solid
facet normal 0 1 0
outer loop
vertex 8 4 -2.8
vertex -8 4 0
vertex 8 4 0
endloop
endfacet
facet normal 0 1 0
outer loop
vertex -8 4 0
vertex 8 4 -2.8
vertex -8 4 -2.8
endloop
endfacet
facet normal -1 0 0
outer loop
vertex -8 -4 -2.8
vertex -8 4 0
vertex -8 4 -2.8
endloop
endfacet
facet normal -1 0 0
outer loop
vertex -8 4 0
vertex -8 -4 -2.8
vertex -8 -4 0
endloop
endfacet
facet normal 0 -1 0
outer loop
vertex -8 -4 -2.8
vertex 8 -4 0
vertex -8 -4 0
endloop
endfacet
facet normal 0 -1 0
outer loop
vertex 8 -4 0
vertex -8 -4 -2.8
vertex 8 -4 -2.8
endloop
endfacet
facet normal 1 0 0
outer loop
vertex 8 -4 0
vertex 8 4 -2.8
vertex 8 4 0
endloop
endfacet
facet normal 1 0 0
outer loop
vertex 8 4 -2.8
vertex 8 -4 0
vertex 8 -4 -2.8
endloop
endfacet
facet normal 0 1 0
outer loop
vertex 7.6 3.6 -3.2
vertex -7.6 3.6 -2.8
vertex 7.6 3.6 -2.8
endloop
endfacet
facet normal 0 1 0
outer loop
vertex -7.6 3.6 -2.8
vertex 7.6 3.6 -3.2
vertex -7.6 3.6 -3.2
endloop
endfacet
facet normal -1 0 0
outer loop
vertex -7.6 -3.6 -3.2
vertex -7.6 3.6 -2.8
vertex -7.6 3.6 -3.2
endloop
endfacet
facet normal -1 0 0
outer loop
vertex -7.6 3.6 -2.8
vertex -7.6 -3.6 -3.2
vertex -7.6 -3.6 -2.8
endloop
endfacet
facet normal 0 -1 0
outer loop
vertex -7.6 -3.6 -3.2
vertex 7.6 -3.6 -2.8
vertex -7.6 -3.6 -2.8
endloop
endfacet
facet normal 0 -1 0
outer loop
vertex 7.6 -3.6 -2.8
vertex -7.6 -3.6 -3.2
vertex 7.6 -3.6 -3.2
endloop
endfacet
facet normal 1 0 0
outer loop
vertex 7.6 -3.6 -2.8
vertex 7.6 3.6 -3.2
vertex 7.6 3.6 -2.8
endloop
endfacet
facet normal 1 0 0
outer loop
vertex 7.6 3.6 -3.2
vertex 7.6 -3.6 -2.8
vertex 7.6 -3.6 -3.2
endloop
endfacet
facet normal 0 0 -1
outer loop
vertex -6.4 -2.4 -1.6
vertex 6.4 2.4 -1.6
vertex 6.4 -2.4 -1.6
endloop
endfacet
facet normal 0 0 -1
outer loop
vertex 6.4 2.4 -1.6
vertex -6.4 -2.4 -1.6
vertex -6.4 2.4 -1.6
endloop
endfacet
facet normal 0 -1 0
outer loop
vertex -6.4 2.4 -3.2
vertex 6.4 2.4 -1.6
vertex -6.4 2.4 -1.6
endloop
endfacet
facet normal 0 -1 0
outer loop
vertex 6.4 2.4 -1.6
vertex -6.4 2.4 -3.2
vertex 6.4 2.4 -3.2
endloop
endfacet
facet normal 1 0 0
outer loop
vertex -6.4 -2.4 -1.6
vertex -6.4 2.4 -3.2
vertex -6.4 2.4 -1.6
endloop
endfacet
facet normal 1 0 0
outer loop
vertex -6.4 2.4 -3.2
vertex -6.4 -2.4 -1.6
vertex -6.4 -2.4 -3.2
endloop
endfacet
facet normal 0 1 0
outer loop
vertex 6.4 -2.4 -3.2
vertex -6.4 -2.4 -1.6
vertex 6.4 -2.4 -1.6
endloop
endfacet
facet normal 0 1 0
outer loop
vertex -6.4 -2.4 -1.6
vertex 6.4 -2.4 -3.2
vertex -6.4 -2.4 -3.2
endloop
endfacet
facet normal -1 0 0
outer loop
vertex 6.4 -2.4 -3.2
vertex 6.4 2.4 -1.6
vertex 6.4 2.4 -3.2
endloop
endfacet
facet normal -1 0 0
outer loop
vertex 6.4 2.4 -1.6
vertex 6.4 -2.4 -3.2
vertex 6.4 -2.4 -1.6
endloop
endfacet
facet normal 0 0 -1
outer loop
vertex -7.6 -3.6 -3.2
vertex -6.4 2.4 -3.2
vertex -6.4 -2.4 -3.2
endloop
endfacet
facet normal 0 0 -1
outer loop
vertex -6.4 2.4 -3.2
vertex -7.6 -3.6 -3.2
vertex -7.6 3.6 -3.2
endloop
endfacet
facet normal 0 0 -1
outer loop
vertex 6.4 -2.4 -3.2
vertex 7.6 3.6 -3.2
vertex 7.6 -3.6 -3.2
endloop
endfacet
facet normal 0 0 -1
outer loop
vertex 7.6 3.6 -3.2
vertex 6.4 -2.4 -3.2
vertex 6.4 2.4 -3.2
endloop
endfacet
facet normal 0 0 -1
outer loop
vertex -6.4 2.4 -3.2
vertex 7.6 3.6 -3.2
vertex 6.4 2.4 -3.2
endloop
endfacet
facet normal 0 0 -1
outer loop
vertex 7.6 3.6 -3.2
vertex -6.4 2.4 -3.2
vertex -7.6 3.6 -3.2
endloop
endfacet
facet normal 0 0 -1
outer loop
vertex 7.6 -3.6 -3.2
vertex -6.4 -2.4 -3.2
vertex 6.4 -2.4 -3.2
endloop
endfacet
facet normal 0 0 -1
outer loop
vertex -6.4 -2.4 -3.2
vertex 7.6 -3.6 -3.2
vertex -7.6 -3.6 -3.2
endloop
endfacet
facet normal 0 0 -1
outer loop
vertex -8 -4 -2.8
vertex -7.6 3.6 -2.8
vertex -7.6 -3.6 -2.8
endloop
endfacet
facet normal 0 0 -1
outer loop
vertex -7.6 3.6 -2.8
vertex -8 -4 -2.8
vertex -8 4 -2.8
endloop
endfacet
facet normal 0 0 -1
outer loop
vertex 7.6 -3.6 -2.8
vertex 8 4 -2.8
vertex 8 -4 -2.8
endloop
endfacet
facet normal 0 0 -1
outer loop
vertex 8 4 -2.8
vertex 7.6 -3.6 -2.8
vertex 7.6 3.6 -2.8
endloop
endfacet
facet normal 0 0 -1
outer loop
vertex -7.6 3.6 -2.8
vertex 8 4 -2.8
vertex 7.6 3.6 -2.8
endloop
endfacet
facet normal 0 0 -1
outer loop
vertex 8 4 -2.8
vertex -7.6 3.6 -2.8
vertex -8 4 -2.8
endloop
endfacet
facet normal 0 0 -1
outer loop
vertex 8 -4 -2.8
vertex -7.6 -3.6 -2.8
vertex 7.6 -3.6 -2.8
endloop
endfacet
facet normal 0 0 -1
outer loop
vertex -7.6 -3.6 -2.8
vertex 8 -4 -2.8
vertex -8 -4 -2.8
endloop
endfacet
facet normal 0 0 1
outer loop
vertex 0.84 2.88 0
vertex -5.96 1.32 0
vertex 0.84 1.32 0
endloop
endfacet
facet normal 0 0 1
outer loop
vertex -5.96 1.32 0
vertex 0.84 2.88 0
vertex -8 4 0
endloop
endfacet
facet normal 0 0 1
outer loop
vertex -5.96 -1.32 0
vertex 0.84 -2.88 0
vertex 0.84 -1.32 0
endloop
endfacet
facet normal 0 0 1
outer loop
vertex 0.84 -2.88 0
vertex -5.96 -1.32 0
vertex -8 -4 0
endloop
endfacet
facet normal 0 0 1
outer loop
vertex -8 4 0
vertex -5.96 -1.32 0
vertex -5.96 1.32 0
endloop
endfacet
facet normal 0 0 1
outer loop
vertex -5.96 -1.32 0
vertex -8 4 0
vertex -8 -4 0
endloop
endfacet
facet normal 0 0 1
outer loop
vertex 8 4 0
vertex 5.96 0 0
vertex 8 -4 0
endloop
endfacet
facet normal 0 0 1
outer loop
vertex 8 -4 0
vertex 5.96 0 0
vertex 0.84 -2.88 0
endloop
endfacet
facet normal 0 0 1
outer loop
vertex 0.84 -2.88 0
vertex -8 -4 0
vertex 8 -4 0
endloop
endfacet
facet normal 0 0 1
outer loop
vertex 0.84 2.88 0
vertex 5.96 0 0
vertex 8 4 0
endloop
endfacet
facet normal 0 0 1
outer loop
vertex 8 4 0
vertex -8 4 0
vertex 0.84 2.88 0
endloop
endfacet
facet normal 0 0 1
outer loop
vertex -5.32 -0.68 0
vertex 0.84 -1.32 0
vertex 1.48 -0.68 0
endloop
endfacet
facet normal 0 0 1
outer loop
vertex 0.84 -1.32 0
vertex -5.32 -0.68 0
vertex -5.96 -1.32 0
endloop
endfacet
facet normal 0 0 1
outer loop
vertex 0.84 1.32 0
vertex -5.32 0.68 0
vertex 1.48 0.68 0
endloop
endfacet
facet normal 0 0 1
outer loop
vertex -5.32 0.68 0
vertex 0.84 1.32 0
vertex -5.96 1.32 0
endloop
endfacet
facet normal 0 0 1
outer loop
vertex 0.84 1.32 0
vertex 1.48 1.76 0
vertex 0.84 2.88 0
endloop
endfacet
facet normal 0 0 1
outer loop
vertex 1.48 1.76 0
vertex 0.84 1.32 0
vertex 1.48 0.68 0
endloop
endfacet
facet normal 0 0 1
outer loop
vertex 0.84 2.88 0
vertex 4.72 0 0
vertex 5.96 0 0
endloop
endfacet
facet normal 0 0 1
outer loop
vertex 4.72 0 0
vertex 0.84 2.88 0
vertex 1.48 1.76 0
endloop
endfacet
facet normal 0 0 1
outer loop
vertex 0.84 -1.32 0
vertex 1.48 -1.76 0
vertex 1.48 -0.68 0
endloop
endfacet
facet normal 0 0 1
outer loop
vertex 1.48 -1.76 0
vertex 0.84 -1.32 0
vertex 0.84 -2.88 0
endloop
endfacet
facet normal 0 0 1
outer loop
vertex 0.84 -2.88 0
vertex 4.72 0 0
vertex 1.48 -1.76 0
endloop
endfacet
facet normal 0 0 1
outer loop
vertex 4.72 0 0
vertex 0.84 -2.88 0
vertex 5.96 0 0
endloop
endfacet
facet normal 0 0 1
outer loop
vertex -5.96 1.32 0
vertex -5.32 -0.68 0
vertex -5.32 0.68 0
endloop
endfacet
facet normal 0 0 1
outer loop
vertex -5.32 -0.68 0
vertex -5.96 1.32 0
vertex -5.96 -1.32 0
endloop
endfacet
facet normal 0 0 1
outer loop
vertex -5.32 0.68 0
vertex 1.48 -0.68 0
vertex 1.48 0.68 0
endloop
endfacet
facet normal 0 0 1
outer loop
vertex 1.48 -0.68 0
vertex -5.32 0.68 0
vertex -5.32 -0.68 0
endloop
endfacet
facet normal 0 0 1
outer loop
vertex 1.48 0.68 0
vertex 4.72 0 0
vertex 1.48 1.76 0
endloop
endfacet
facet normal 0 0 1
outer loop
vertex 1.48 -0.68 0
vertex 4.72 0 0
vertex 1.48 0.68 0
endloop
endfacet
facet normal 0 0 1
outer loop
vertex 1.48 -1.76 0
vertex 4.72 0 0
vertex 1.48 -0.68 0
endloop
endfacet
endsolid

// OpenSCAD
// file: ../p/4-4edge.scad
use <../lib.scad>
$fa=1; $fs=0.2;
function ldraw_lib__4_4edge(realsolid=false) = [
// 0 Circle 1.0
// 0 Name: 4-4edge.dat
// 0 Author: James Jessiman
// 0 !LDRAW_ORG Primitive UPDATE 2017-01
// 0 !LICENSE Licensed under CC BY 2.0 and CC BY 4.0 : see CAreadme.txt
// 
// 0 BFC CERTIFY CCW
  [0,"BFC","CERTIFY"],
  [0,"BFC","CCW"],
// 
// 0 !HISTORY 1998-12-15 [PTadmin] Official Update 1998-10
// 0 !HISTORY 2005-12-28 [PTadmin] Official Update 2005-01
// 0 !HISTORY 2007-06-24 [PTadmin] Header formatted for Contributor Agreement
// 0 !HISTORY 2008-07-01 [PTadmin] Official Update 2008-01
// 0 !HISTORY 2017-01-15 [Steffen] BFCed
// 0 !HISTORY 2017-12-30 [PTadmin] Official Update 2017-01
// 
// 
// 2 24 1 0 0 0.9239 0 0.3827
  [2,24,1,0,0,0.9239,0,0.3827],
// 2 24 0.9239 0 0.3827 0.7071 0 0.7071
  [2,24,0.9239,0,0.3827,0.7071,0,0.7071],
// 2 24 0.7071 0 0.7071 0.3827 0 0.9239
  [2,24,0.7071,0,0.7071,0.3827,0,0.9239],
// 2 24 0.3827 0 0.9239 0 0 1
  [2,24,0.3827,0,0.9239,0,0,1],
// 2 24 0 0 1 -0.3827 0 0.9239
  [2,24,0,0,1,-0.3827,0,0.9239],
// 2 24 -0.3827 0 0.9239 -0.7071 0 0.7071
  [2,24,-0.3827,0,0.9239,-0.7071,0,0.7071],
// 2 24 -0.7071 0 0.7071 -0.9239 0 0.3827
  [2,24,-0.7071,0,0.7071,-0.9239,0,0.3827],
// 2 24 -0.9239 0 0.3827 -1 0 -0
  [2,24,-0.9239,0,0.3827,-1,0,-0],
// 2 24 -1 0 -0 -0.9239 0 -0.3827
  [2,24,-1,0,-0,-0.9239,0,-0.3827],
// 2 24 -0.9239 0 -0.3827 -0.7071 0 -0.7071
  [2,24,-0.9239,0,-0.3827,-0.7071,0,-0.7071],
// 2 24 -0.7071 0 -0.7071 -0.3827 0 -0.9239
  [2,24,-0.7071,0,-0.7071,-0.3827,0,-0.9239],
// 2 24 -0.3827 0 -0.9239 0 0 -1
  [2,24,-0.3827,0,-0.9239,0,0,-1],
// 2 24 0 0 -1 0.3827 0 -0.9239
  [2,24,0,0,-1,0.3827,0,-0.9239],
// 2 24 0.3827 0 -0.9239 0.7071 0 -0.7071
  [2,24,0.3827,0,-0.9239,0.7071,0,-0.7071],
// 2 24 0.7071 0 -0.7071 0.9239 0 -0.3827
  [2,24,0.7071,0,-0.7071,0.9239,0,-0.3827],
// 2 24 0.9239 0 -0.3827 1 0 0
  [2,24,0.9239,0,-0.3827,1,0,0],
];
module ldraw_lib__4_4edge(step=0, col=false, unit=2/5, alt=false, line=0.2, solid=!$preview)
    makepoly(ldraw_lib__4_4edge(solid), step=step, col=col, unit=unit, alt=alt, line=line, solid=solid);
ldraw_lib__4_4edge(line=0.2);
// file: ../p/4-4disc.scad
use <../lib.scad>
$fa=1; $fs=0.2;
function ldraw_lib__4_4disc(realsolid=false) = [
// 0 Disc 1.0
// 0 Name: 4-4disc.dat
// 0 Author: James Jessiman
// 0 !LDRAW_ORG Primitive UPDATE 2002-02
// 0 !LICENSE Licensed under CC BY 2.0 and CC BY 4.0 : see CAreadme.txt
// 
// 0 BFC CERTIFY CCW
  [0,"BFC","CERTIFY"],
  [0,"BFC","CCW"],
// 
// 0 !HISTORY 1998-12-15 [PTadmin] Official Update 1998-10
// 0 !HISTORY 2002-03-23 [sbliss] Added BFC statement
// 0 !HISTORY 2002-04-25 [PTadmin] Official Update 2002-02
// 0 !HISTORY 2007-06-24 [PTadmin] Header formatted for Contributor Agreement
// 0 !HISTORY 2008-07-01 [PTadmin] Official Update 2008-01
// 
// 
// 3 16 0 0 0 1 0 0 0.9239 0 0.3827
  [3,16,0,0,0,1,0,0,0.9239,0,0.3827],
// 3 16 0 0 0 0.9239 0 0.3827 0.7071 0 0.7071
  [3,16,0,0,0,0.9239,0,0.3827,0.7071,0,0.7071],
// 3 16 0 0 0 0.7071 0 0.7071 0.3827 0 0.9239
  [3,16,0,0,0,0.7071,0,0.7071,0.3827,0,0.9239],
// 3 16 0 0 0 0.3827 0 0.9239 0 0 1
  [3,16,0,0,0,0.3827,0,0.9239,0,0,1],
// 3 16 0 0 0 0 0 1 -0.3827 0 0.9239
  [3,16,0,0,0,0,0,1,-0.3827,0,0.9239],
// 3 16 0 0 0 -0.3827 0 0.9239 -0.7071 0 0.7071
  [3,16,0,0,0,-0.3827,0,0.9239,-0.7071,0,0.7071],
// 3 16 0 0 0 -0.7071 0 0.7071 -0.9239 0 0.3827
  [3,16,0,0,0,-0.7071,0,0.7071,-0.9239,0,0.3827],
// 3 16 0 0 0 -0.9239 0 0.3827 -1 0 -0
  [3,16,0,0,0,-0.9239,0,0.3827,-1,0,-0],
// 3 16 0 0 0 -1 0 -0 -0.9239 0 -0.3827
  [3,16,0,0,0,-1,0,-0,-0.9239,0,-0.3827],
// 3 16 0 0 0 -0.9239 0 -0.3827 -0.7071 0 -0.7071
  [3,16,0,0,0,-0.9239,0,-0.3827,-0.7071,0,-0.7071],
// 3 16 0 0 0 -0.7071 0 -0.7071 -0.3827 0 -0.9239
  [3,16,0,0,0,-0.7071,0,-0.7071,-0.3827,0,-0.9239],
// 3 16 0 0 0 -0.3827 0 -0.9239 0 0 -1
  [3,16,0,0,0,-0.3827,0,-0.9239,0,0,-1],
// 3 16 0 0 0 0 0 -1 0.3827 0 -0.9239
  [3,16,0,0,0,0,0,-1,0.3827,0,-0.9239],
// 3 16 0 0 0 0.3827 0 -0.9239 0.7071 0 -0.7071
  [3,16,0,0,0,0.3827,0,-0.9239,0.7071,0,-0.7071],
// 3 16 0 0 0 0.7071 0 -0.7071 0.9239 0 -0.3827
  [3,16,0,0,0,0.7071,0,-0.7071,0.9239,0,-0.3827],
// 3 16 0 0 0 0.9239 0 -0.3827 1 0 0
  [3,16,0,0,0,0.9239,0,-0.3827,1,0,0],
// 0
];
module ldraw_lib__4_4disc(step=0, col=false, unit=2/5, alt=false, line=0.2, solid=!$preview)
    makepoly(ldraw_lib__4_4disc(solid), step=step, col=col, unit=unit, alt=alt, line=line, solid=solid);
ldraw_lib__4_4disc(line=0.2);
// file: ../p/4-4cyli.scad
use <../lib.scad>
$fa=1; $fs=0.2;
function ldraw_lib__4_4cyli(realsolid=false) = [
// 0 Cylinder 1.0
// 0 Name: 4-4cyli.dat
// 0 Author: James Jessiman
// 0 !LDRAW_ORG Primitive UPDATE 2005-01
// 0 !LICENSE Licensed under CC BY 2.0 and CC BY 4.0 : see CAreadme.txt
// 
// 0 BFC CERTIFY CCW
  [0,"BFC","CERTIFY"],
  [0,"BFC","CCW"],
// 
// 0 !HISTORY 1998-12-15 [PTadmin] Official Update 1998-10
// 0 !HISTORY 2002-03-23 [sbliss] Added BFC statement; merged headers from files in distributions LDraw 0.27 and Complete.
// 0 !HISTORY 2002-04-25 [PTadmin] Official Update 2002-02
// 0 !HISTORY 2004-12-14 [guyvivan] BFC CCW
// 0 !HISTORY 2005-12-28 [PTadmin] Official Update 2005-01
// 0 !HISTORY 2007-06-24 [PTadmin] Header formatted for Contributor Agreement
// 0 !HISTORY 2008-07-01 [PTadmin] Official Update 2008-01
// 
// 
// 4 16 1 1 0 0.9239 1 0.3827 0.9239 0 0.3827 1 0 0
  [4,16,1,1,0,0.9239,1,0.3827,0.9239,0,0.3827,1,0,0],
// 5 24 1 0 0 1 1 0 0.9239 0 0.3827 0.9239 0 -0.3827
  [5,24,1,0,0,1,1,0,0.9239,0,0.3827,0.9239,0,-0.3827],
// 4 16 0.9239 1 0.3827 0.7071 1 0.7071 0.7071 0 0.7071 0.9239 0 0.3827
  [4,16,0.9239,1,0.3827,0.7071,1,0.7071,0.7071,0,0.7071,0.9239,0,0.3827],
// 5 24 0.9239 0 0.3827 0.9239 1 0.3827 0.7071 0 0.7071 1 0 0
  [5,24,0.9239,0,0.3827,0.9239,1,0.3827,0.7071,0,0.7071,1,0,0],
// 4 16 0.7071 1 0.7071 0.3827 1 0.9239 0.3827 0 0.9239 0.7071 0 0.7071
  [4,16,0.7071,1,0.7071,0.3827,1,0.9239,0.3827,0,0.9239,0.7071,0,0.7071],
// 5 24 0.7071 0 0.7071 0.7071 1 0.7071 0.3827 0 0.9239 0.9239 0 0.3827
  [5,24,0.7071,0,0.7071,0.7071,1,0.7071,0.3827,0,0.9239,0.9239,0,0.3827],
// 4 16 0.3827 1 0.9239 0 1 1 0 0 1 0.3827 0 0.9239
  [4,16,0.3827,1,0.9239,0,1,1,0,0,1,0.3827,0,0.9239],
// 5 24 0.3827 0 0.9239 0.3827 1 0.9239 0 0 1 0.7071 0 0.7071
  [5,24,0.3827,0,0.9239,0.3827,1,0.9239,0,0,1,0.7071,0,0.7071],
// 4 16 0 1 1 -0.3827 1 0.9239 -0.3827 0 0.9239 0 0 1
  [4,16,0,1,1,-0.3827,1,0.9239,-0.3827,0,0.9239,0,0,1],
// 5 24 0 0 1 0 1 1 -0.3827 0 0.9239 0.3827 0 0.9239
  [5,24,0,0,1,0,1,1,-0.3827,0,0.9239,0.3827,0,0.9239],
// 4 16 -0.3827 1 0.9239 -0.7071 1 0.7071 -0.7071 0 0.7071 -0.3827 0 0.9239
  [4,16,-0.3827,1,0.9239,-0.7071,1,0.7071,-0.7071,0,0.7071,-0.3827,0,0.9239],
// 5 24 -0.3827 0 0.9239 -0.3827 1 0.9239 -0.7071 0 0.7071 0 0 1
  [5,24,-0.3827,0,0.9239,-0.3827,1,0.9239,-0.7071,0,0.7071,0,0,1],
// 4 16 -0.7071 1 0.7071 -0.9239 1 0.3827 -0.9239 0 0.3827 -0.7071 0 0.7071
  [4,16,-0.7071,1,0.7071,-0.9239,1,0.3827,-0.9239,0,0.3827,-0.7071,0,0.7071],
// 5 24 -0.7071 0 0.7071 -0.7071 1 0.7071 -0.9239 0 0.3827 -0.3827 0 0.9239
  [5,24,-0.7071,0,0.7071,-0.7071,1,0.7071,-0.9239,0,0.3827,-0.3827,0,0.9239],
// 4 16 -0.9239 1 0.3827 -1 1 0 -1 0 0 -0.9239 0 0.3827
  [4,16,-0.9239,1,0.3827,-1,1,0,-1,0,0,-0.9239,0,0.3827],
// 5 24 -0.9239 0 0.3827 -0.9239 1 0.3827 -1 0 0 -0.7071 0 0.7071
  [5,24,-0.9239,0,0.3827,-0.9239,1,0.3827,-1,0,0,-0.7071,0,0.7071],
// 4 16 -1 1 0 -0.9239 1 -0.3827 -0.9239 0 -0.3827 -1 0 0
  [4,16,-1,1,0,-0.9239,1,-0.3827,-0.9239,0,-0.3827,-1,0,0],
// 5 24 -1 0 0 -1 1 0 -0.9239 0 -0.3827 -0.9239 0 0.3827
  [5,24,-1,0,0,-1,1,0,-0.9239,0,-0.3827,-0.9239,0,0.3827],
// 4 16 -0.9239 1 -0.3827 -0.7071 1 -0.7071 -0.7071 0 -0.7071 -0.9239 0 -0.3827
  [4,16,-0.9239,1,-0.3827,-0.7071,1,-0.7071,-0.7071,0,-0.7071,-0.9239,0,-0.3827],
// 5 24 -0.9239 0 -0.3827 -0.9239 1 -0.3827 -0.7071 0 -0.7071 -1 0 0
  [5,24,-0.9239,0,-0.3827,-0.9239,1,-0.3827,-0.7071,0,-0.7071,-1,0,0],
// 4 16 -0.7071 1 -0.7071 -0.3827 1 -0.9239 -0.3827 0 -0.9239 -0.7071 0 -0.7071
  [4,16,-0.7071,1,-0.7071,-0.3827,1,-0.9239,-0.3827,0,-0.9239,-0.7071,0,-0.7071],
// 5 24 -0.7071 0 -0.7071 -0.7071 1 -0.7071 -0.3827 0 -0.9239 -0.9239 0 -0.3827
  [5,24,-0.7071,0,-0.7071,-0.7071,1,-0.7071,-0.3827,0,-0.9239,-0.9239,0,-0.3827],
// 4 16 -0.3827 1 -0.9239 0 1 -1 0 0 -1 -0.3827 0 -0.9239
  [4,16,-0.3827,1,-0.9239,0,1,-1,0,0,-1,-0.3827,0,-0.9239],
// 5 24 -0.3827 0 -0.9239 -0.3827 1 -0.9239 0 0 -1 -0.7071 0 -0.7071
  [5,24,-0.3827,0,-0.9239,-0.3827,1,-0.9239,0,0,-1,-0.7071,0,-0.7071],
// 4 16 0 1 -1 0.3827 1 -0.9239 0.3827 0 -0.9239 0 0 -1
  [4,16,0,1,-1,0.3827,1,-0.9239,0.3827,0,-0.9239,0,0,-1],
// 5 24 0 0 -1 0 1 -1 0.3827 0 -0.9239 -0.3827 0 -0.9239
  [5,24,0,0,-1,0,1,-1,0.3827,0,-0.9239,-0.3827,0,-0.9239],
// 4 16 0.3827 1 -0.9239 0.7071 1 -0.7071 0.7071 0 -0.7071 0.3827 0 -0.9239
  [4,16,0.3827,1,-0.9239,0.7071,1,-0.7071,0.7071,0,-0.7071,0.3827,0,-0.9239],
// 5 24 0.3827 0 -0.9239 0.3827 1 -0.9239 0.7071 0 -0.7071 0 0 -1
  [5,24,0.3827,0,-0.9239,0.3827,1,-0.9239,0.7071,0,-0.7071,0,0,-1],
// 4 16 0.7071 1 -0.7071 0.9239 1 -0.3827 0.9239 0 -0.3827 0.7071 0 -0.7071
  [4,16,0.7071,1,-0.7071,0.9239,1,-0.3827,0.9239,0,-0.3827,0.7071,0,-0.7071],
// 5 24 0.7071 0 -0.7071 0.7071 1 -0.7071 0.9239 0 -0.3827 0.3827 0 -0.9239
  [5,24,0.7071,0,-0.7071,0.7071,1,-0.7071,0.9239,0,-0.3827,0.3827,0,-0.9239],
// 4 16 0.9239 1 -0.3827 1 1 0 1 0 0 0.9239 0 -0.3827
  [4,16,0.9239,1,-0.3827,1,1,0,1,0,0,0.9239,0,-0.3827],
// 5 24 0.9239 0 -0.3827 0.9239 1 -0.3827 1 0 0 0.7071 0 -0.7071
  [5,24,0.9239,0,-0.3827,0.9239,1,-0.3827,1,0,0,0.7071,0,-0.7071],
// 0
];
module ldraw_lib__4_4cyli(step=0, col=false, unit=2/5, alt=false, line=0.2, solid=!$preview)
    makepoly(ldraw_lib__4_4cyli(solid), step=step, col=col, unit=unit, alt=alt, line=line, solid=solid);
ldraw_lib__4_4cyli(line=0.2);
// file: ../p/stud3.scad
use <../lib.scad>
use <4-4cyli.scad>
use <4-4disc.scad>
use <4-4edge.scad>
$fa=1; $fs=0.2;
function ldraw_lib__stud3(realsolid=false) = realsolid ? 
    [openscad(translate([0,0,-eps()], o=cylinder(4+eps(), r=4)),2)] : [
// 0 Stud Tube Solid
// 0 Name: stud3.dat
// 0 Author: James Jessiman
// 0 !LDRAW_ORG Primitive UPDATE 2012-01
// 0 !LICENSE Licensed under CC BY 2.0 and CC BY 4.0 : see CAreadme.txt
// 
// 0 BFC CERTIFY CCW
  [0,"BFC","CERTIFY"],
  [0,"BFC","CCW"],
// 
// 0 !HISTORY 2002-04-04 [sbliss] Modified for BFC compliance
// 0 !HISTORY 2002-04-25 [PTadmin] Official Update 2002-02
// 0 !HISTORY 2007-06-24 [PTadmin] Header formatted for Contributor Agreement
// 0 !HISTORY 2008-07-01 [PTadmin] Official Update 2008-01
// 0 !HISTORY 2012-02-16 [Philo] Changed to CCW
// 0 !HISTORY 2012-03-30 [PTadmin] Official Update 2012-01
// 
// 
// 1 16 0 -4 0 4 0 0 0 1 0 0 0 4 4-4edge.dat
  [1,16,0,-4,0,4,0,0,0,1,0,0,0,4, ldraw_lib__4_4edge(realsolid)],
// 1 16 0 0 0 4 0 0 0 1 0 0 0 4 4-4edge.dat
  [1,16,0,0,0,4,0,0,0,1,0,0,0,4, ldraw_lib__4_4edge(realsolid)],
// 1 16 0 -4 0 4 0 0 0 1 0 0 0 4 4-4disc.dat
  [1,16,0,-4,0,4,0,0,0,1,0,0,0,4, ldraw_lib__4_4disc(realsolid)],
// 1 16 0 -4 0 4 0 0 0 4 0 0 0 4 4-4cyli.dat
  [1,16,0,-4,0,4,0,0,0,4,0,0,0,4, ldraw_lib__4_4cyli(realsolid)],
];
module ldraw_lib__stud3(step=0, col=false, unit=2/5, alt=false, line=0.2, solid=!$preview)
    makepoly(ldraw_lib__stud3(solid), step=step, col=col, unit=unit, alt=alt, line=line, solid=solid);
ldraw_lib__stud3(line=0.2);
// file: ../p/stud.scad
use <../lib.scad>
use <4-4cyli.scad>
use <4-4disc.scad>
use <4-4edge.scad>
$fa=1; $fs=0.2;
function ldraw_lib__stud(realsolid=false) = realsolid ? 
    [openscad(translate([0,0,-eps()], o=cylinder(4+eps(), r=6)),2)] : [
// 0 Stud
// 0 Name: stud.dat
// 0 Author: James Jessiman
// 0 !LDRAW_ORG Primitive UPDATE 2012-01
// 0 !LICENSE Licensed under CC BY 2.0 and CC BY 4.0 : see CAreadme.txt
// 
// 0 BFC CERTIFY CCW
  [0,"BFC","CERTIFY"],
  [0,"BFC","CCW"],
// 
// 0 !HISTORY 2002-04-04 [sbliss] Modified for BFC compliance
// 0 !HISTORY 2002-04-25 [PTadmin] Official Update 2002-02
// 0 !HISTORY 2007-06-24 [PTadmin] Header formatted for Contributor Agreement
// 0 !HISTORY 2008-07-01 [PTadmin] Official Update 2008-01
// 0 !HISTORY 2012-02-16 [Philo] Changed to CCW
// 0 !HISTORY 2012-03-30 [PTadmin] Official Update 2012-01
// 
// 
// 1 16 0 0 0 6 0 0 0 1 0 0 0 6 4-4edge.dat
  [1,16,0,0,0,6,0,0,0,1,0,0,0,6, ldraw_lib__4_4edge(realsolid)],
// 1 16 0 -4 0 6 0 0 0 1 0 0 0 6 4-4edge.dat
  [1,16,0,-4,0,6,0,0,0,1,0,0,0,6, ldraw_lib__4_4edge(realsolid)],
// 1 16 0 0 0 6 0 0 0 -4 0 0 0 6 4-4cyli.dat
  [1,16,0,0,0,6,0,0,0,-4,0,0,0,6, ldraw_lib__4_4cyli(realsolid)],
// 1 16 0 -4 0 6 0 0 0 1 0 0 0 6 4-4disc.dat
  [1,16,0,-4,0,6,0,0,0,1,0,0,0,6, ldraw_lib__4_4disc(realsolid)],
];
module ldraw_lib__stud(step=0, col=false, unit=2/5, alt=false, line=0.2, solid=!$preview)
    makepoly(ldraw_lib__stud(solid), step=step, col=col, unit=unit, alt=alt, line=line, solid=solid);
ldraw_lib__stud(line=0.2);
// file: ../p/box4t.scad
use <../lib.scad>
$fa=1; $fs=0.2;
function ldraw_lib__box4t(realsolid=false) = [
// 0 Box with 4 Adjacent Faces and All Edges
// 0 Name: box4t.dat
// 0 Author: Tore Eriksson [Tore_Eriksson]
// 0 !LDRAW_ORG Primitive UPDATE 2003-02
// 0 !LICENSE Licensed under CC BY 2.0 and CC BY 4.0 : see CAreadme.txt
// 
// 0 BFC CERTIFY CCW
  [0,"BFC","CERTIFY"],
  [0,"BFC","CCW"],
// 
// 0 !HISTORY 1997-09-29 [PTadmin] Official Update 1997-15
// 0 !HISTORY 2002-08-31 [izanette] Modified with WINDZ for BFC compliance
// 0 !HISTORY 2003-08-01 [PTadmin] Official Update 2003-02
// 0 !HISTORY 2007-06-24 [PTadmin] Header formatted for Contributor Agreement
// 0 !HISTORY 2008-07-01 [PTadmin] Official Update 2008-01
// 
// 
// 2 24 1 1 1 -1 1 1
  [2,24,1,1,1,-1,1,1],
// 2 24 -1 1 1 -1 1 -1
  [2,24,-1,1,1,-1,1,-1],
// 2 24 -1 1 -1 1 1 -1
  [2,24,-1,1,-1,1,1,-1],
// 2 24 1 1 -1 1 1 1
  [2,24,1,1,-1,1,1,1],
// 2 24 1 0 1 -1 0 1
  [2,24,1,0,1,-1,0,1],
// 2 24 -1 0 1 -1 0 -1
  [2,24,-1,0,1,-1,0,-1],
// 2 24 -1 0 -1 1 0 -1
  [2,24,-1,0,-1,1,0,-1],
// 2 24 1 0 -1 1 0 1
  [2,24,1,0,-1,1,0,1],
// 2 24 1 0 1 1 1 1
  [2,24,1,0,1,1,1,1],
// 2 24 -1 0 1 -1 1 1
  [2,24,-1,0,1,-1,1,1],
// 2 24 1 0 -1 1 1 -1
  [2,24,1,0,-1,1,1,-1],
// 2 24 -1 0 -1 -1 1 -1
  [2,24,-1,0,-1,-1,1,-1],
// 4 16 1 1 1 1 1 -1 -1 1 -1 -1 1 1
  [4,16,1,1,1,1,1,-1,-1,1,-1,-1,1,1],
// 4 16 1 1 1 -1 1 1 -1 0 1 1 0 1
  [4,16,1,1,1,-1,1,1,-1,0,1,1,0,1],
// 4 16 -1 1 1 -1 1 -1 -1 0 -1 -1 0 1
  [4,16,-1,1,1,-1,1,-1,-1,0,-1,-1,0,1],
// 0 4 16 -1 1 -1 -1 0 -1 1 0 -1 1 1 -1
// 4 16 1 1 -1 1 1 1 1 0 1 1 0 -1
  [4,16,1,1,-1,1,1,1,1,0,1,1,0,-1],
// 0
];
module ldraw_lib__box4t(step=0, col=false, unit=2/5, alt=false, line=0.2, solid=!$preview)
    makepoly(ldraw_lib__box4t(solid), step=step, col=col, unit=unit, alt=alt, line=line, solid=solid);
ldraw_lib__box4t(line=0.2);
// file: ../p/box5.scad
use <../lib.scad>
$fa=1; $fs=0.2;
function ldraw_lib__box5(realsolid=false) = [
// 0 Box with 5 Faces and All Edges
// 0 Name: box5.dat
// 0 Author: James Jessiman
// 0 !LDRAW_ORG Primitive UPDATE 2012-01
// 0 !LICENSE Licensed under CC BY 2.0 and CC BY 4.0 : see CAreadme.txt
// 
// 0 BFC CERTIFY CCW
  [0,"BFC","CERTIFY"],
  [0,"BFC","CCW"],
// 
// 0 !HISTORY 2002-04-03 [sbliss] Modified for BFC compliance
// 0 !HISTORY 2002-04-25 [PTadmin] Official Update 2002-02
// 0 !HISTORY 2007-06-24 [PTadmin] Header formatted for Contributor Agreement
// 0 !HISTORY 2008-07-01 [PTadmin] Official Update 2008-01
// 0 !HISTORY 2012-02-16 [Philo] Changed to CCW
// 0 !HISTORY 2012-03-30 [PTadmin] Official Update 2012-01
// 
// 
// 2 24 1 1 1 -1 1 1
  [2,24,1,1,1,-1,1,1],
// 2 24 -1 1 1 -1 1 -1
  [2,24,-1,1,1,-1,1,-1],
// 2 24 -1 1 -1 1 1 -1
  [2,24,-1,1,-1,1,1,-1],
// 2 24 1 1 -1 1 1 1
  [2,24,1,1,-1,1,1,1],
// 2 24 1 0 1 -1 0 1
  [2,24,1,0,1,-1,0,1],
// 2 24 -1 0 1 -1 0 -1
  [2,24,-1,0,1,-1,0,-1],
// 2 24 -1 0 -1 1 0 -1
  [2,24,-1,0,-1,1,0,-1],
// 2 24 1 0 -1 1 0 1
  [2,24,1,0,-1,1,0,1],
// 2 24 1 0 1 1 1 1
  [2,24,1,0,1,1,1,1],
// 2 24 -1 0 1 -1 1 1
  [2,24,-1,0,1,-1,1,1],
// 2 24 1 0 -1 1 1 -1
  [2,24,1,0,-1,1,1,-1],
// 2 24 -1 0 -1 -1 1 -1
  [2,24,-1,0,-1,-1,1,-1],
// 4 16 -1 1 1 1 1 1 1 1 -1 -1 1 -1
  [4,16,-1,1,1,1,1,1,1,1,-1,-1,1,-1],
// 4 16 -1 1 1 -1 0 1 1 0 1 1 1 1
  [4,16,-1,1,1,-1,0,1,1,0,1,1,1,1],
// 4 16 -1 1 -1 -1 0 -1 -1 0 1 -1 1 1
  [4,16,-1,1,-1,-1,0,-1,-1,0,1,-1,1,1],
// 4 16 1 1 -1 1 0 -1 -1 0 -1 -1 1 -1
  [4,16,1,1,-1,1,0,-1,-1,0,-1,-1,1,-1],
// 4 16 1 1 1 1 0 1 1 0 -1 1 1 -1
  [4,16,1,1,1,1,0,1,1,0,-1,1,1,-1],
];
module ldraw_lib__box5(step=0, col=false, unit=2/5, alt=false, line=0.2, solid=!$preview)
    makepoly(ldraw_lib__box5(solid), step=step, col=col, unit=unit, alt=alt, line=line, solid=solid);
ldraw_lib__box5(line=0.2);
// file: ../p/box4.scad
use <../lib.scad>
$fa=1; $fs=0.2;
function ldraw_lib__box4(realsolid=false) = [
// 0 Box with 4 Faces (2 Parallel Pairs) and All Edges
// 0 Name: box4.dat
// 0 Author: James Jessiman
// 0 !LDRAW_ORG Primitive UPDATE 2012-01
// 0 !LICENSE Licensed under CC BY 2.0 and CC BY 4.0 : see CAreadme.txt
// 
// 0 BFC CERTIFY CCW
  [0,"BFC","CERTIFY"],
  [0,"BFC","CCW"],
// 
// 0 !HISTORY 2002-04-03 [sbliss] Modified for BFC compliance
// 0 !HISTORY 2002-04-25 [PTadmin] Official Update 2002-02
// 0 !HISTORY 2007-06-24 [PTadmin] Header formatted for Contributor Agreement
// 0 !HISTORY 2008-07-01 [PTadmin] Official Update 2008-01
// 0 !HISTORY 2012-02-16 [Philo] Changed to CCW
// 0 !HISTORY 2012-03-30 [PTadmin] Official Update 2012-01
// 
// 
// 2 24 1 1 1 -1 1 1
  [2,24,1,1,1,-1,1,1],
// 2 24 -1 1 1 -1 1 -1
  [2,24,-1,1,1,-1,1,-1],
// 2 24 -1 1 -1 1 1 -1
  [2,24,-1,1,-1,1,1,-1],
// 2 24 1 1 -1 1 1 1
  [2,24,1,1,-1,1,1,1],
// 2 24 1 0 1 -1 0 1
  [2,24,1,0,1,-1,0,1],
// 2 24 -1 0 1 -1 0 -1
  [2,24,-1,0,1,-1,0,-1],
// 2 24 -1 0 -1 1 0 -1
  [2,24,-1,0,-1,1,0,-1],
// 2 24 1 0 -1 1 0 1
  [2,24,1,0,-1,1,0,1],
// 2 24 1 0 1 1 1 1
  [2,24,1,0,1,1,1,1],
// 2 24 -1 0 1 -1 1 1
  [2,24,-1,0,1,-1,1,1],
// 2 24 1 0 -1 1 1 -1
  [2,24,1,0,-1,1,1,-1],
// 2 24 -1 0 -1 -1 1 -1
  [2,24,-1,0,-1,-1,1,-1],
// 4 16 -1 1 1 -1 0 1 1 0 1 1 1 1
  [4,16,-1,1,1,-1,0,1,1,0,1,1,1,1],
// 4 16 -1 1 -1 -1 0 -1 -1 0 1 -1 1 1
  [4,16,-1,1,-1,-1,0,-1,-1,0,1,-1,1,1],
// 4 16 1 1 -1 1 0 -1 -1 0 -1 -1 1 -1
  [4,16,1,1,-1,1,0,-1,-1,0,-1,-1,1,-1],
// 4 16 1 1 1 1 0 1 1 0 -1 1 1 -1
  [4,16,1,1,1,1,0,1,1,0,-1,1,1,-1],
];
module ldraw_lib__box4(step=0, col=false, unit=2/5, alt=false, line=0.2, solid=!$preview)
    makepoly(ldraw_lib__box4(solid), step=step, col=col, unit=unit, alt=alt, line=line, solid=solid);
ldraw_lib__box4(line=0.2);
// file: s/3004s01.scad
use <../../lib.scad>
use <../../p/box4t.scad>
use <../../p/box5.scad>
use <../../p/stud.scad>
use <../../p/stud3.scad>
$fa=1; $fs=0.2;
function ldraw_lib__s__3004s01(realsolid=false) = [
// 0 ~Brick  1 x  2 without Front Face
// 0 Name: s\3004s01.dat
// 0 Author: James Jessiman
// 0 !LDRAW_ORG Subpart UPDATE 2003-03
// 0 !LICENSE Licensed under CC BY 2.0 and CC BY 4.0 : see CAreadme.txt
// 
// 0 BFC CERTIFY CCW
  [0,"BFC","CERTIFY"],
  [0,"BFC","CCW"],
// 
// 0 !HISTORY 2003-09-07 [jriley] Subfiling, BFC
// 0 !HISTORY 2003-12-19 [PTadmin] Official Update 2003-03
// 0 !HISTORY 2007-08-29 [PTadmin] Header formatted for Contributor Agreement
// 0 !HISTORY 2008-07-01 [PTadmin] Official Update 2008-01
// 
// 
// 1 16 0 4 0 1 0 0 0 -5 0 0 0 1 stud3.dat
  [1,16,0,4,0,1,0,0,0,-5,0,0,0,1, ldraw_lib__stud3(realsolid)],
// 0 BFC INVERTNEXT
  [0,"BFC","INVERTNEXT"],
// 1 16 0 24 0 16 0 0 0 -20 0 0 0 6 box5.dat
  [1,16,0,24,0,16,0,0,0,-20,0,0,0,6, ldraw_lib__box5(realsolid)],
// 4 16 20 24 10 16 24 6 -16 24 6 -20 24 10
  [4,16,20,24,10,16,24,6,-16,24,6,-20,24,10],
// 4 16 -20 24 10 -16 24 6 -16 24 -6 -20 24 -10
  [4,16,-20,24,10,-16,24,6,-16,24,-6,-20,24,-10],
// 4 16 -20 24 -10 -16 24 -6 16 24 -6 20 24 -10
  [4,16,-20,24,-10,-16,24,-6,16,24,-6,20,24,-10],
// 4 16 20 24 -10 16 24 -6 16 24 6 20 24 10
  [4,16,20,24,-10,16,24,-6,16,24,6,20,24,10],
// 1 16 0 24 0 20 0 0 0 -24 0 0 0 10 box4t.dat
  [1,16,0,24,0,20,0,0,0,-24,0,0,0,10, ldraw_lib__box4t(realsolid)],
// 1 16 10 0 0 1 0 0 0 1 0 0 0 1 stud.dat
  [1,16,10,0,0,1,0,0,0,1,0,0,0,1, ldraw_lib__stud(realsolid)],
// 1 16 -10 0 0 1 0 0 0 1 0 0 0 1 stud.dat
  [1,16,-10,0,0,1,0,0,0,1,0,0,0,1, ldraw_lib__stud(realsolid)],
// 0
];
module ldraw_lib__s__3004s01(step=0, col=false, unit=2/5, alt=false, line=0.2, solid=!$preview)
    makepoly(ldraw_lib__s__3004s01(solid), step=step, col=col, unit=unit, alt=alt, line=line, solid=solid);
ldraw_lib__s__3004s01(line=0.2);
// file: s/3069p06c.scad
use <../../lib.scad>
$fa=1; $fs=0.2;
function ldraw_lib__s__3069p06c(realsolid=false) = [
// 0 ~Tile  1 x  2 with Arrow Long Pattern (Arrow)
// 0 Name: s\3069p06c.dat
// 0 Author: William Howard [WilliamH]
// 0 !LDRAW_ORG Subpart UPDATE 2009-03
// 0 !LICENSE Licensed under CC BY 2.0 and CC BY 4.0 : see CAreadme.txt
// 
// 0 BFC CERTIFY CCW
  [0,"BFC","CERTIFY"],
  [0,"BFC","CCW"],
// 
// 0 !HISTORY 2009-05-02 [PTadmin] Official Update 2009-01
// 0 !HISTORY 2009-08-18 [anathema] Improved pattern
// 0 !HISTORY 2009-12-29 [PTadmin] Official Update 2009-03
// 
// 
// 4 16 -13.3 0 -1.7 3.7 0 -1.7 3.7 0 1.7 -13.3 0 1.7
  [4,16,-13.3,0,-1.7,3.7,0,-1.7,3.7,0,1.7,-13.3,0,1.7],
// 3 16 3.7 0 1.7 11.8 0 0 3.7 0 4.4
  [3,16,3.7,0,1.7,11.8,0,0,3.7,0,4.4],
// 3 16 3.7 0 -1.7 11.8 0 0 3.7 0 1.7
  [3,16,3.7,0,-1.7,11.8,0,0,3.7,0,1.7],
// 3 16 3.7 0 -4.4 11.8 0 0 3.7 0 -1.7
  [3,16,3.7,0,-4.4,11.8,0,0,3.7,0,-1.7],
// 0
];
module ldraw_lib__s__3069p06c(step=0, col=false, unit=2/5, alt=false, line=0.2, solid=!$preview)
    makepoly(ldraw_lib__s__3069p06c(solid), step=step, col=col, unit=unit, alt=alt, line=line, solid=solid);
ldraw_lib__s__3069p06c(line=0.2);
// file: s/3069p06b.scad
use <../../lib.scad>
$fa=1; $fs=0.2;
function ldraw_lib__s__3069p06b(realsolid=false) = [
// 0 ~Tile  1 x  2 with Arrow Long Pattern (Border)
// 0 Name: s\3069p06b.dat
// 0 Author: William Howard [WilliamH]
// 0 !LDRAW_ORG Subpart UPDATE 2009-03
// 0 !LICENSE Licensed under CC BY 2.0 and CC BY 4.0 : see CAreadme.txt
// 
// 0 BFC CERTIFY CCW
  [0,"BFC","CERTIFY"],
  [0,"BFC","CCW"],
// 
// 0 !HISTORY 2009-05-02 [PTadmin] Official Update 2009-01
// 0 !HISTORY 2009-08-18 [anathema] Improved pattern
// 0 !HISTORY 2009-10-09 [cwdee] Corrected small overlap
// 0 !HISTORY 2009-12-29 [PTadmin] Official Update 2009-03
// 
// 
// 4 16 -14.9 0 -3.3 2.1 0 -3.3 3.7 0 -1.7 -13.3 0 -1.7
  [4,16,-14.9,0,-3.3,2.1,0,-3.3,3.7,0,-1.7,-13.3,0,-1.7],
// 4 16 -13.3 0 1.7 3.7 0 1.7 2.1 0 3.3 -14.9 0 3.3
  [4,16,-13.3,0,1.7,3.7,0,1.7,2.1,0,3.3,-14.9,0,3.3],
// 4 16 2.1 0 7.2 2.1 0 3.3 3.7 0 1.7 3.7 0 4.4
  [4,16,2.1,0,7.2,2.1,0,3.3,3.7,0,1.7,3.7,0,4.4],
// 4 16 3.7 0 4.4 11.8 0 0 14.9 0 0 2.1 0 7.2
  [4,16,3.7,0,4.4,11.8,0,0,14.9,0,0,2.1,0,7.2],
// 4 16 3.7 0 -4.4 3.7 0 -1.7 2.1 0 -3.3 2.1 0 -7.2
  [4,16,3.7,0,-4.4,3.7,0,-1.7,2.1,0,-3.3,2.1,0,-7.2],
// 4 16 2.1 0 -7.2 14.9 0 0 11.8 0 0 3.7 0 -4.4
  [4,16,2.1,0,-7.2,14.9,0,0,11.8,0,0,3.7,0,-4.4],
// 4 16 -14.9 0 3.3 -14.9 0 -3.3 -13.3 0 -1.7 -13.3 0 1.7
  [4,16,-14.9,0,3.3,-14.9,0,-3.3,-13.3,0,-1.7,-13.3,0,1.7],
// 0
];
module ldraw_lib__s__3069p06b(step=0, col=false, unit=2/5, alt=false, line=0.2, solid=!$preview)
    makepoly(ldraw_lib__s__3069p06b(solid), step=step, col=col, unit=unit, alt=alt, line=line, solid=solid);
ldraw_lib__s__3069p06b(line=0.2);
// file: s/3069p06a.scad
use <../../lib.scad>
$fa=1; $fs=0.2;
function ldraw_lib__s__3069p06a(realsolid=false) = [
// 0 ~Tile  1 x  2 with Arrow Long Pattern (Mask)
// 0 Name: s\3069p06a.dat
// 0 Author: William Howard [WilliamH]
// 0 !LDRAW_ORG Subpart UPDATE 2009-03
// 0 !LICENSE Licensed under CC BY 2.0 and CC BY 4.0 : see CAreadme.txt
// 
// 0 BFC CERTIFY CCW
  [0,"BFC","CERTIFY"],
  [0,"BFC","CCW"],
// 
// 0 !HISTORY 2009-05-02 [PTadmin] Official Update 2009-01
// 0 !HISTORY 2009-08-18 [anathema] Improved pattern
// 0 !HISTORY 2009-12-29 [PTadmin] Official Update 2009-03
// 
// 
// 4 16 -14.9 0 3.3 2.1 0 3.3 2.1 0 7.2 -20 0 10
  [4,16,-14.9,0,3.3,2.1,0,3.3,2.1,0,7.2,-20,0,10],
// 4 16 -20 0 -10 2.1 0 -7.2 2.1 0 -3.3 -14.9 0 -3.3
  [4,16,-20,0,-10,2.1,0,-7.2,2.1,0,-3.3,-14.9,0,-3.3],
// 4 16 -20 0 10 -20 0 -10 -14.9 0 -3.3 -14.9 0 3.3
  [4,16,-20,0,10,-20,0,-10,-14.9,0,-3.3,-14.9,0,3.3],
// 3 16 20 0 10 14.9 0 0 20 0 -10
  [3,16,20,0,10,14.9,0,0,20,0,-10],
// 3 16 20 0 -10 14.9 0 0 2.1 0 -7.2
  [3,16,20,0,-10,14.9,0,0,2.1,0,-7.2],
// 3 16 2.1 0 -7.2 -20 0 -10 20 0 -10
  [3,16,2.1,0,-7.2,-20,0,-10,20,0,-10],
// 3 16 2.1 0 7.2 14.9 0 0 20 0 10
  [3,16,2.1,0,7.2,14.9,0,0,20,0,10],
// 3 16 20 0 10 -20 0 10 2.1 0 7.2
  [3,16,20,0,10,-20,0,10,2.1,0,7.2],
// 0
];
module ldraw_lib__s__3069p06a(step=0, col=false, unit=2/5, alt=false, line=0.2, solid=!$preview)
    makepoly(ldraw_lib__s__3069p06a(solid), step=step, col=col, unit=unit, alt=alt, line=line, solid=solid);
ldraw_lib__s__3069p06a(line=0.2);
// file: s/3069bs01.scad
use <../../lib.scad>
use <../../p/box4.scad>
use <../../p/box5.scad>
$fa=1; $fs=0.2;
function ldraw_lib__s__3069bs01(realsolid=false) = [
// 0 ~Tile  1 x  2 with Groove without Top Face
// 0 Name: s\3069bs01.dat
// 0 Author: Santeri Piippo [arezey]
// 0 !LDRAW_ORG Subpart UPDATE 2010-02
// 0 !LICENSE Licensed under CC BY 2.0 and CC BY 4.0 : see CAreadme.txt
// 
// 0 BFC CERTIFY CCW
  [0,"BFC","CERTIFY"],
  [0,"BFC","CCW"],
// 
// 0 !HISTORY 2010-07-05 [PTadmin] Official Update 2010-02
// 
// 
// 1 16 0 0 0 20 0 0 0 7 0 0 0 10 box4.dat
  [1,16,0,0,0,20,0,0,0,7,0,0,0,10, ldraw_lib__box4(realsolid)],
// 1 16 0 7 0 19 0 0 0 1 0 0 0 9 box4.dat
  [1,16,0,7,0,19,0,0,0,1,0,0,0,9, ldraw_lib__box4(realsolid)],
// 0 BFC INVERTNEXT
  [0,"BFC","INVERTNEXT"],
// 1 16 0 8 0 16 0 0 0 -4 0 0 0 6 box5.dat
  [1,16,0,8,0,16,0,0,0,-4,0,0,0,6, ldraw_lib__box5(realsolid)],
// 4 16 -19 8 9 -16 8 6 -16 8 -6 -19 8 -9
  [4,16,-19,8,9,-16,8,6,-16,8,-6,-19,8,-9],
// 4 16 19 8 -9 16 8 -6 16 8 6 19 8 9
  [4,16,19,8,-9,16,8,-6,16,8,6,19,8,9],
// 4 16 19 8 9 16 8 6 -16 8 6 -19 8 9
  [4,16,19,8,9,16,8,6,-16,8,6,-19,8,9],
// 4 16 -19 8 -9 -16 8 -6 16 8 -6 19 8 -9
  [4,16,-19,8,-9,-16,8,-6,16,8,-6,19,8,-9],
// 4 16 -20 7 10 -19 7 9 -19 7 -9 -20 7 -10
  [4,16,-20,7,10,-19,7,9,-19,7,-9,-20,7,-10],
// 4 16 20 7 -10 19 7 -9 19 7 9 20 7 10
  [4,16,20,7,-10,19,7,-9,19,7,9,20,7,10],
// 4 16 20 7 10 19 7 9 -19 7 9 -20 7 10
  [4,16,20,7,10,19,7,9,-19,7,9,-20,7,10],
// 4 16 -20 7 -10 -19 7 -9 19 7 -9 20 7 -10
  [4,16,-20,7,-10,-19,7,-9,19,7,-9,20,7,-10],
// 0 //
];
module ldraw_lib__s__3069bs01(step=0, col=false, unit=2/5, alt=false, line=0.2, solid=!$preview)
    makepoly(ldraw_lib__s__3069bs01(solid), step=step, col=col, unit=unit, alt=alt, line=line, solid=solid);
ldraw_lib__s__3069bs01(line=0.2);
// file: 3004.scad
use <../lib.scad>
use <s/3004s01.scad>
$fa=1; $fs=0.2;
function ldraw_lib__3004(realsolid=false) = [
// 0 Brick  1 x  2
// 0 Name: 3004.dat
// 0 Author: James Jessiman
// 0 !LDRAW_ORG Part UPDATE 2022-05
// 0 !LICENSE Licensed under CC BY 2.0 and CC BY 4.0 : see CAreadme.txt
// 
// 0 BFC CERTIFY CCW
  [0,"BFC","CERTIFY"],
  [0,"BFC","CCW"],
// 
// 0 !HISTORY 2001-10-26 [PTadmin] Official Update 2001-01
// 0 !HISTORY 2002-05-07 {unknown} BFC Certification
// 0 !HISTORY 2002-06-11 [PTadmin] Official Update 2002-03
// 0 !HISTORY 2007-05-07 [PTadmin] Header formatted for Contributor Agreement
// 0 !HISTORY 2008-07-01 [PTadmin] Official Update 2008-01
// 0 !HISTORY 2022-08-04 [MagFors] Using subfile
// 0 !HISTORY 2022-09-15 [PTadmin] Official Update 2022-05
// 
// 
// 1 16 0 0 0 1 0 0 0 1 0 0 0 1 s\3004s01.dat
  [1,16,0,0,0,1,0,0,0,1,0,0,0,1, ldraw_lib__s__3004s01(realsolid)],
// 4 16 -20 24 -10 20 24 -10 20 0 -10 -20 0 -10
  [4,16,-20,24,-10,20,24,-10,20,0,-10,-20,0,-10],
];
module ldraw_lib__3004(step=0, col=false, unit=2/5, alt=false, line=0.2, solid=!$preview)
    makepoly(ldraw_lib__3004(solid), step=step, col=col, unit=unit, alt=alt, line=line, solid=solid);
ldraw_lib__3004(line=0.2);
// file: 3069bp07.scad
use <../lib.scad>
use <s/3069bs01.scad>
use <s/3069p06a.scad>
use <s/3069p06b.scad>
use <s/3069p06c.scad>
$fa=1; $fs=0.2;
function ldraw_lib__3069bp07(realsolid=false) = [
// 0 Tile  1 x  2 with Arrow Long DkRed with Silver Border Pattern
// 0 Name: 3069bp07.dat
// 0 Author: William Howard [WilliamH]
// 0 !LDRAW_ORG Part UPDATE 2013-01
// 0 !LICENSE Licensed under CC BY 2.0 and CC BY 4.0 : see CAreadme.txt
// 
// 0 BFC CERTIFY CCW
  [0,"BFC","CERTIFY"],
  [0,"BFC","CCW"],
// 
// 0 !HISTORY 2009-05-02 [PTadmin] Official Update 2009-01
// 0 !HISTORY 2009-08-14 [anathema] Corrected border colour
// 0 !HISTORY 2009-12-29 [PTadmin] Official Update 2009-03
// 0 !HISTORY 2013-02-17 [MagFors] Changed colour 179 to 80 (printed silver)
// 0 !HISTORY 2013-07-21 [PTadmin] Official Update 2013-01
// 
// 
// 1 16 0 0 0 1 0 0 0 1 0 0 0 1 s\3069bs01.dat
  [1,16,0,0,0,1,0,0,0,1,0,0,0,1, ldraw_lib__s__3069bs01(realsolid)],
// 1 16 0 0 0 1 0 0 0 1 0 0 0 1 s\3069p06a.dat
  [1,16,0,0,0,1,0,0,0,1,0,0,0,1, ldraw_lib__s__3069p06a(realsolid)],
// 1 80 0 0 0 1 0 0 0 1 0 0 0 1 s\3069p06b.dat
  [1,80,0,0,0,1,0,0,0,1,0,0,0,1, ldraw_lib__s__3069p06b(realsolid)],
// 1 320 0 0 0 1 0 0 0 1 0 0 0 1 s\3069p06c.dat
  [1,320,0,0,0,1,0,0,0,1,0,0,0,1, ldraw_lib__s__3069p06c(realsolid)],
];
module ldraw_lib__3069bp07(step=0, col=false, unit=2/5, alt=false, line=0.2, solid=!$preview)
    makepoly(ldraw_lib__3069bp07(solid), step=step, col=col, unit=unit, alt=alt, line=line, solid=solid);
ldraw_lib__3069bp07(line=0.2);
// main file
use <../lib.scad>
use <3069bp07.scad>
$fa=1; $fs=0.2;
function ldraw_lib__3069p07(realsolid=false) = [
// 0 ~Moved to 3069bp07
// 0 Name: 3069p07.dat
// 0 Author: [PTadmin]
// 0 !LDRAW_ORG Part UPDATE 2002-01
// 0 !LICENSE Licensed under CC BY 4.0 : see CAreadme.txt
// 
// 0 BFC CERTIFY CCW
  [0,"BFC","CERTIFY"],
  [0,"BFC","CCW"],
// 
// 0 !HISTORY 1999-12-31 [PTadmin] Official Update 1999-06
// 0 !HISTORY 2002-02-18 [PTadmin] Official Update 2002-01
// 0 !HISTORY 2007-06-13 [PTadmin] Header formatted for Contributor Agreement
// 0 !HISTORY 2008-07-01 [PTadmin] Official Update 2008-01
// 
// 
// 1 16 0 0 0 1 0 0 0 1 0 0 0 1 3069bp07.dat
  [1,16,0,0,0,1,0,0,0,1,0,0,0,1, ldraw_lib__3069bp07(realsolid)],
];
module ldraw_lib__3069p07(step=0, col=false, unit=2/5, alt=false, line=0.2, solid=!$preview)
    makepoly(ldraw_lib__3069p07(solid), step=step, col=col, unit=unit, alt=alt, line=line, solid=solid);
ldraw_lib__3069p07(line=0.2);
